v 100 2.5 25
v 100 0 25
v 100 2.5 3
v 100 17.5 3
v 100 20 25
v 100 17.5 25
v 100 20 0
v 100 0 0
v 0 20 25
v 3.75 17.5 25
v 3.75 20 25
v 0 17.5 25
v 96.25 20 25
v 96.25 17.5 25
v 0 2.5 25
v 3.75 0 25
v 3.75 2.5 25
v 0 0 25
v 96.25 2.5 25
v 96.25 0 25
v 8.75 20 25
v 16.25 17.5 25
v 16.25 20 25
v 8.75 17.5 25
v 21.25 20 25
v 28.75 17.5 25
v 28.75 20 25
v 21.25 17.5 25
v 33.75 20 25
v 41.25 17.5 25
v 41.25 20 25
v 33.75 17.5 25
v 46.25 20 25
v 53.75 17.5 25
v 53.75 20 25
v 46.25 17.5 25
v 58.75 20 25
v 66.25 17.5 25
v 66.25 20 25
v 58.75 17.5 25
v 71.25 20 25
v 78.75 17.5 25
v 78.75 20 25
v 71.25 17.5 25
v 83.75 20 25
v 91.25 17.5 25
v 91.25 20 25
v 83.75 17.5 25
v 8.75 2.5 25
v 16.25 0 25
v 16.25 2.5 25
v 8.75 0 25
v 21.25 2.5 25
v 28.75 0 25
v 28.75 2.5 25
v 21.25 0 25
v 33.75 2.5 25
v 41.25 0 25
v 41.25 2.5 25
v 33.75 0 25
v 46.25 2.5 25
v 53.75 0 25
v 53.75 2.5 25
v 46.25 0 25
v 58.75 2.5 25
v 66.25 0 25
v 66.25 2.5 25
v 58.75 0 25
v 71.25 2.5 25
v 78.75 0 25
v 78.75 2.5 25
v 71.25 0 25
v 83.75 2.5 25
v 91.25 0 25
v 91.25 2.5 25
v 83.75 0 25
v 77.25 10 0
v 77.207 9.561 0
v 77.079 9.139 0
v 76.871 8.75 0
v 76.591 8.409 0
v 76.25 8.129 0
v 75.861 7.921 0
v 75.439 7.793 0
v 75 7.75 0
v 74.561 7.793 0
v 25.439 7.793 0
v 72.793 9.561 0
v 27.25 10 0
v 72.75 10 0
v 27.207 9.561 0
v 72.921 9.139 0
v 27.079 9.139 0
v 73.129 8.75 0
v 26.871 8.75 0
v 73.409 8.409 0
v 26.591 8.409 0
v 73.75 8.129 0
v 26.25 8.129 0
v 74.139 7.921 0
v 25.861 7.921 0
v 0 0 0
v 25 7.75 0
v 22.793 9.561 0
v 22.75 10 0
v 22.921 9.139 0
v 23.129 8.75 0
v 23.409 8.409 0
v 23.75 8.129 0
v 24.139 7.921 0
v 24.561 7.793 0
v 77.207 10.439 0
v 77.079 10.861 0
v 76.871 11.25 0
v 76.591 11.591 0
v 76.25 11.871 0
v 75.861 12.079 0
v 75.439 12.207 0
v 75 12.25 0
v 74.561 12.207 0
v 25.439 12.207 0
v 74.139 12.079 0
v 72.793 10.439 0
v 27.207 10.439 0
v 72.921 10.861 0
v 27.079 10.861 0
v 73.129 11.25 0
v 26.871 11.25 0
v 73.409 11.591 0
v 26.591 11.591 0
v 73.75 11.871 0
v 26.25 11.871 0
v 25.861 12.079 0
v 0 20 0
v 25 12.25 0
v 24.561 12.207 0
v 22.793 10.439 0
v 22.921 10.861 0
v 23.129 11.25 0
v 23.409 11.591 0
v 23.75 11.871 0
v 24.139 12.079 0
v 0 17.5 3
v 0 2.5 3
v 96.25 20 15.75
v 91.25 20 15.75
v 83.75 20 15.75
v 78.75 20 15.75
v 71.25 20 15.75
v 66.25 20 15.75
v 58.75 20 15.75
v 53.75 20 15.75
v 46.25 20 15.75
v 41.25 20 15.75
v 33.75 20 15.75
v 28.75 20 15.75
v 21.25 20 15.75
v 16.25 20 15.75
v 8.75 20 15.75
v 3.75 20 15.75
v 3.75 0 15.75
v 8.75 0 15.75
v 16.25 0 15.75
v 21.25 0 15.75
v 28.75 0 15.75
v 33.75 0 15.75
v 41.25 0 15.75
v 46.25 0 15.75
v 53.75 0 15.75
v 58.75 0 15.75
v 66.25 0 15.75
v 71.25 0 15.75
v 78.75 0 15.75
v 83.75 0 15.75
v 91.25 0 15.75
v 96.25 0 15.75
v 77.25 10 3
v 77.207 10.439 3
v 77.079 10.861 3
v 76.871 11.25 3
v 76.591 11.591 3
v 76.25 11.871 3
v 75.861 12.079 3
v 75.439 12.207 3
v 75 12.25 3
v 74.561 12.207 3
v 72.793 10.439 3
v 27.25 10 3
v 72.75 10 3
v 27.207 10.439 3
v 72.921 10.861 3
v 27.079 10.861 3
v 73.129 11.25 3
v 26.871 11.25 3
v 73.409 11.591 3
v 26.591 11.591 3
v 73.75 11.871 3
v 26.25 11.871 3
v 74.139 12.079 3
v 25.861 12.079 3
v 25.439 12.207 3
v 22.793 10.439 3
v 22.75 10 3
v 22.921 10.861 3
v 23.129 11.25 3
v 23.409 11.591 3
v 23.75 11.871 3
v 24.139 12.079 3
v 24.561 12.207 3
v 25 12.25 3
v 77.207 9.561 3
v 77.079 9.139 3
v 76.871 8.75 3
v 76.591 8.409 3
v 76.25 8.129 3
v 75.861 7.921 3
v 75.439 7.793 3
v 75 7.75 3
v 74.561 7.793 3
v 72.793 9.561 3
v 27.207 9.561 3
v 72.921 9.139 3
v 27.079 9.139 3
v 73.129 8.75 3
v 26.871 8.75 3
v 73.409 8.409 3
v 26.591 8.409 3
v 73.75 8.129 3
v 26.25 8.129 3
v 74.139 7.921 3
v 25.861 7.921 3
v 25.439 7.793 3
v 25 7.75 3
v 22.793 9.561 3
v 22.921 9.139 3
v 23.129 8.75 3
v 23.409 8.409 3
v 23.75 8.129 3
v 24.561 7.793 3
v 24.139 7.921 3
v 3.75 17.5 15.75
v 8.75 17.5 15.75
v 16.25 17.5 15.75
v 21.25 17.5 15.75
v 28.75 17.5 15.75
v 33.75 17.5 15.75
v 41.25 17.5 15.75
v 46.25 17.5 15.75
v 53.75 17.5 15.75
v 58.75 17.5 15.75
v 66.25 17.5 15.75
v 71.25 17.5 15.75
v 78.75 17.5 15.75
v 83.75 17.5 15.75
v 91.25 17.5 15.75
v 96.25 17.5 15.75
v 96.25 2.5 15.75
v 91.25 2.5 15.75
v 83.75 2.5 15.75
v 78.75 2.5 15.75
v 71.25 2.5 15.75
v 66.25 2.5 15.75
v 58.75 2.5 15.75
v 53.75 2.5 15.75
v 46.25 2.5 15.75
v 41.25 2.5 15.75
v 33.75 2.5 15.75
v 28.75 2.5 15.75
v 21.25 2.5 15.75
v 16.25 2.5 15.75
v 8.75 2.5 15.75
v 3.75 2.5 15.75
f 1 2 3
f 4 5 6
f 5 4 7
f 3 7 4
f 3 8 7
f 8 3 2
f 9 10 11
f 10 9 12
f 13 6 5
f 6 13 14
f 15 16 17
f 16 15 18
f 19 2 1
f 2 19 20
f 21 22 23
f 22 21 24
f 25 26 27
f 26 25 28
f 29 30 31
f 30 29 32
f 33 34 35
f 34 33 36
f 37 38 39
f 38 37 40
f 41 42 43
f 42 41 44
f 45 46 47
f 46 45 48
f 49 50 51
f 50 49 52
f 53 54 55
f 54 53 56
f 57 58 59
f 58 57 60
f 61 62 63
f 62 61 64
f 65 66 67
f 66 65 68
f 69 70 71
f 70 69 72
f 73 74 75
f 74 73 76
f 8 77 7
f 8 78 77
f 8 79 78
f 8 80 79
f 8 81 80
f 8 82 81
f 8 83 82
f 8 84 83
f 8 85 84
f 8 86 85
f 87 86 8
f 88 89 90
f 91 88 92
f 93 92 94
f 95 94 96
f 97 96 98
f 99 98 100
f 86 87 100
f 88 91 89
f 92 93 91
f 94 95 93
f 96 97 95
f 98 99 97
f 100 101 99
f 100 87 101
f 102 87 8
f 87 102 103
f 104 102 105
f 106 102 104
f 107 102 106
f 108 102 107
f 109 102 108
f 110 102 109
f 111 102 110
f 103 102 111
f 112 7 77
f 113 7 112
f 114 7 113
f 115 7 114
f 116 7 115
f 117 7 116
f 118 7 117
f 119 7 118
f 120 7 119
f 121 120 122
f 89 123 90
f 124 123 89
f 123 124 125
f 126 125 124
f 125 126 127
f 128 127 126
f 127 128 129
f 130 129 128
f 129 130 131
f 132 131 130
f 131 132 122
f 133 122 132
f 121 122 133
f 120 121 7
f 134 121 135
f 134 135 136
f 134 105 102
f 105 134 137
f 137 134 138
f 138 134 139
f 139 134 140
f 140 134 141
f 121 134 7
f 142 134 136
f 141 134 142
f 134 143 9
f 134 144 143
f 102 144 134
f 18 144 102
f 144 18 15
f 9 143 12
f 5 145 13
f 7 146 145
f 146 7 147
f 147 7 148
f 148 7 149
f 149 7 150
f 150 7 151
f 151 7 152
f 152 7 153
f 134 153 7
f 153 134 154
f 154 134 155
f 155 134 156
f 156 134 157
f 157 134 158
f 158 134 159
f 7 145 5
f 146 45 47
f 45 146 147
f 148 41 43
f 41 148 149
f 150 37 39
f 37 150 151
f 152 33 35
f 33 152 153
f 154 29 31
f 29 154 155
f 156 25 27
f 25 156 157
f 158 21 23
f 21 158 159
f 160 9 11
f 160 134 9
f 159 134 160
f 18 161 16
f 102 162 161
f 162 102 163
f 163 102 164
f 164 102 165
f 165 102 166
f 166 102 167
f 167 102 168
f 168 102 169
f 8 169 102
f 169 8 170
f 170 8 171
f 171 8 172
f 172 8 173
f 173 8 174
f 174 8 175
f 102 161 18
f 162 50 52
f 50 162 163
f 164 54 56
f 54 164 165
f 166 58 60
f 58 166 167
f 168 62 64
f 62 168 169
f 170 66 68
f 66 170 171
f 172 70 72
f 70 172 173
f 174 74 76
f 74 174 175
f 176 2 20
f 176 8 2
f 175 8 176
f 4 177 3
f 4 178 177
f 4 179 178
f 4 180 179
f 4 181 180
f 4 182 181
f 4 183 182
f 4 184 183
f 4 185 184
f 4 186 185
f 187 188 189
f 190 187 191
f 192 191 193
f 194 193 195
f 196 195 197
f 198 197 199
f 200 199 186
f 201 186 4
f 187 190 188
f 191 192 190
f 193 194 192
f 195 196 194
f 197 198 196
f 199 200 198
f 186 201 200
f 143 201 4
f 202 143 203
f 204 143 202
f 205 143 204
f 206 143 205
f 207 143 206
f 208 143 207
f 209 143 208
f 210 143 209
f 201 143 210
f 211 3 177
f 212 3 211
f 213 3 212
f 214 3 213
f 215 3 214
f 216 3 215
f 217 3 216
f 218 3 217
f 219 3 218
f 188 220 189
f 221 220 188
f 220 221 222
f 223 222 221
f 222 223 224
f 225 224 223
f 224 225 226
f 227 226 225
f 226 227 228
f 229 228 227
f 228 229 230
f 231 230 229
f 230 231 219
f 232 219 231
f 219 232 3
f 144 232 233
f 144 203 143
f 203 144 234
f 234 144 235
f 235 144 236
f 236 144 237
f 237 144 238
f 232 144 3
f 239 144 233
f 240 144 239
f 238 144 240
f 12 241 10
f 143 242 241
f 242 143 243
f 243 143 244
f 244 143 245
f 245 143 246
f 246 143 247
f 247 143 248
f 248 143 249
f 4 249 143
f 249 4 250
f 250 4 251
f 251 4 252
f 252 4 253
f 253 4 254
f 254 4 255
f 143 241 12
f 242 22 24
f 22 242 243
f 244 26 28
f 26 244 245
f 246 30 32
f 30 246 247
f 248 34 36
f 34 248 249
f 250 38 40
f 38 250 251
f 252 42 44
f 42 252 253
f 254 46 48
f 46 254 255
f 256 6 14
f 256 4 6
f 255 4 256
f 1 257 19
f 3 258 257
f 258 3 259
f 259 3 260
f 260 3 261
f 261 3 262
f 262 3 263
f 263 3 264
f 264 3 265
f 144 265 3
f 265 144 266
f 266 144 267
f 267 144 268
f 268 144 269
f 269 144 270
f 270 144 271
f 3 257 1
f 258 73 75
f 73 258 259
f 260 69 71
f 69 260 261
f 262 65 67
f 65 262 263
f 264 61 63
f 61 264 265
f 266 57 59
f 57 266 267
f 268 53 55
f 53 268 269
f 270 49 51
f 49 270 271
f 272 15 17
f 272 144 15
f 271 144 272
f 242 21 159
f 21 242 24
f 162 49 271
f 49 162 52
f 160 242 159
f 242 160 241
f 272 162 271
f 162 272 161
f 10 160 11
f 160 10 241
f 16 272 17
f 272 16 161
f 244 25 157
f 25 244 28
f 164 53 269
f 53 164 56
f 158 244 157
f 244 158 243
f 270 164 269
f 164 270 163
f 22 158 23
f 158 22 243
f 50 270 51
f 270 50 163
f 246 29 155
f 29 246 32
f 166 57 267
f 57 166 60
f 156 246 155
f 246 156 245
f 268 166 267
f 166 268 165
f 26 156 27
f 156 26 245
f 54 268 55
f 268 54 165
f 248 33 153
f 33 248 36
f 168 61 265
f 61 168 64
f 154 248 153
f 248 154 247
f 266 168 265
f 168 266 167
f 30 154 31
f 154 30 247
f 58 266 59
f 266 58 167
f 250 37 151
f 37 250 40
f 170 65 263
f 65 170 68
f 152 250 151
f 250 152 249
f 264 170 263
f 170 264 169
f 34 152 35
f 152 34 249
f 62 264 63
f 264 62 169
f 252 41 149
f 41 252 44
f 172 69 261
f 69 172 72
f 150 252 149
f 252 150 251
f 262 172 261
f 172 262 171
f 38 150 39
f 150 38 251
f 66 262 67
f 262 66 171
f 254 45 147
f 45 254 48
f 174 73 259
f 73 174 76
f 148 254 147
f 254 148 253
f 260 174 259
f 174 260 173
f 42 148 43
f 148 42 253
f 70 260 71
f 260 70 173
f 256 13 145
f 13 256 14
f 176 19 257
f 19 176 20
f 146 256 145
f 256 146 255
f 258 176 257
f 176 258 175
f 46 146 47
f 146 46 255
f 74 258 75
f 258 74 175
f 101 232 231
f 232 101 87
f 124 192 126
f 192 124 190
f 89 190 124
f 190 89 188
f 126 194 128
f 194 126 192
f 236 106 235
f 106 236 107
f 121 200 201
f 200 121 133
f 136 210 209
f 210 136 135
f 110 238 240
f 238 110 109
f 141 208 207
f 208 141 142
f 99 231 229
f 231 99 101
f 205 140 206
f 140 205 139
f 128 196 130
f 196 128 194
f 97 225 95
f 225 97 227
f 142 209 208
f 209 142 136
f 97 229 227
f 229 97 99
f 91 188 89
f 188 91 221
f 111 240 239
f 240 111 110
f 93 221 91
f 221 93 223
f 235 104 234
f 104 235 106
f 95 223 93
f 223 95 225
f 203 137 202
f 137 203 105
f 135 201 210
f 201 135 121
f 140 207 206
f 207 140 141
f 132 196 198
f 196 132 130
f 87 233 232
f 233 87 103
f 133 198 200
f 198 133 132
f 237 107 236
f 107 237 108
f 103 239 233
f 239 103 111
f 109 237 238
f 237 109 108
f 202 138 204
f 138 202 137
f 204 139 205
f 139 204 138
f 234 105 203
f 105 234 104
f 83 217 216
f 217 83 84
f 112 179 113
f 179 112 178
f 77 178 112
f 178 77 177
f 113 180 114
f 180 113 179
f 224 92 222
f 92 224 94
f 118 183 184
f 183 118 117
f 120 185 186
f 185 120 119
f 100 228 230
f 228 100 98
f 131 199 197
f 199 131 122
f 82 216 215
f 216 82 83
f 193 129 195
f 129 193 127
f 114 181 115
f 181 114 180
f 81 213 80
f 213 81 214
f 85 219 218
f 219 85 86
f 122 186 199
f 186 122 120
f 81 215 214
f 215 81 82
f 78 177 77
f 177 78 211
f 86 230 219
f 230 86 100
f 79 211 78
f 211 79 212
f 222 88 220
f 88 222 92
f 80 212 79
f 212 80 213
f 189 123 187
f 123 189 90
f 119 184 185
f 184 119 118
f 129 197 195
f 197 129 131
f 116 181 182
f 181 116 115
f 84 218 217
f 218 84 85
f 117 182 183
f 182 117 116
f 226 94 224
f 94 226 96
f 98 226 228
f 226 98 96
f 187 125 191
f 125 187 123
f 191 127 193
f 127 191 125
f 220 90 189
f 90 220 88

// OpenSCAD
$fn = 32;

// ----------------------------------------------------------------------
// Cable duct: 100 x 20 x 25 mm, 8 fingers
// ----------------------------------------------------------------------

// --- parameters (mm) ---
duct_len = 100;           // duct length, X
duct_w = 20;              // duct width, Y
duct_h = 25;              // duct height, Z
wall_t = 2.5;             // side wall thickness
floor_t = 3;              // floor thickness
slot_w = 5;               // finger slot width
slot_h = 12.75;           // finger slot height
fingers = 8;              // number of finger slots per side
pitch = 12.5;             // finger pitch
hole_d = 4.5;             // floor mounting hole
hole_n = 2;               // mounting holes in the floor

module shell() {
  difference() {
    cube([duct_len, duct_w, duct_h]);
    /* open top channel */
    translate([-wall_t - 1, wall_t, floor_t])
      cube([duct_len + 2 * wall_t + 2, duct_w - 2 * wall_t, duct_h + 1]);
  }
}

difference() {
  union() {
    shell();
  }
  /* finger slots cut through both side walls */
  for (i = [0 : fingers - 1]) translate([pitch / 2 + i * pitch - slot_w / 2, -1, floor_t + slot_h]) cube([slot_w, duct_w + 2, duct_h]);
  for (i = [0 : hole_n - 1]) translate([(duct_len / hole_n) * (i + 0.5), duct_w / 2, -1]) cylinder(h = floor_t + 2, d = hole_d);
}
